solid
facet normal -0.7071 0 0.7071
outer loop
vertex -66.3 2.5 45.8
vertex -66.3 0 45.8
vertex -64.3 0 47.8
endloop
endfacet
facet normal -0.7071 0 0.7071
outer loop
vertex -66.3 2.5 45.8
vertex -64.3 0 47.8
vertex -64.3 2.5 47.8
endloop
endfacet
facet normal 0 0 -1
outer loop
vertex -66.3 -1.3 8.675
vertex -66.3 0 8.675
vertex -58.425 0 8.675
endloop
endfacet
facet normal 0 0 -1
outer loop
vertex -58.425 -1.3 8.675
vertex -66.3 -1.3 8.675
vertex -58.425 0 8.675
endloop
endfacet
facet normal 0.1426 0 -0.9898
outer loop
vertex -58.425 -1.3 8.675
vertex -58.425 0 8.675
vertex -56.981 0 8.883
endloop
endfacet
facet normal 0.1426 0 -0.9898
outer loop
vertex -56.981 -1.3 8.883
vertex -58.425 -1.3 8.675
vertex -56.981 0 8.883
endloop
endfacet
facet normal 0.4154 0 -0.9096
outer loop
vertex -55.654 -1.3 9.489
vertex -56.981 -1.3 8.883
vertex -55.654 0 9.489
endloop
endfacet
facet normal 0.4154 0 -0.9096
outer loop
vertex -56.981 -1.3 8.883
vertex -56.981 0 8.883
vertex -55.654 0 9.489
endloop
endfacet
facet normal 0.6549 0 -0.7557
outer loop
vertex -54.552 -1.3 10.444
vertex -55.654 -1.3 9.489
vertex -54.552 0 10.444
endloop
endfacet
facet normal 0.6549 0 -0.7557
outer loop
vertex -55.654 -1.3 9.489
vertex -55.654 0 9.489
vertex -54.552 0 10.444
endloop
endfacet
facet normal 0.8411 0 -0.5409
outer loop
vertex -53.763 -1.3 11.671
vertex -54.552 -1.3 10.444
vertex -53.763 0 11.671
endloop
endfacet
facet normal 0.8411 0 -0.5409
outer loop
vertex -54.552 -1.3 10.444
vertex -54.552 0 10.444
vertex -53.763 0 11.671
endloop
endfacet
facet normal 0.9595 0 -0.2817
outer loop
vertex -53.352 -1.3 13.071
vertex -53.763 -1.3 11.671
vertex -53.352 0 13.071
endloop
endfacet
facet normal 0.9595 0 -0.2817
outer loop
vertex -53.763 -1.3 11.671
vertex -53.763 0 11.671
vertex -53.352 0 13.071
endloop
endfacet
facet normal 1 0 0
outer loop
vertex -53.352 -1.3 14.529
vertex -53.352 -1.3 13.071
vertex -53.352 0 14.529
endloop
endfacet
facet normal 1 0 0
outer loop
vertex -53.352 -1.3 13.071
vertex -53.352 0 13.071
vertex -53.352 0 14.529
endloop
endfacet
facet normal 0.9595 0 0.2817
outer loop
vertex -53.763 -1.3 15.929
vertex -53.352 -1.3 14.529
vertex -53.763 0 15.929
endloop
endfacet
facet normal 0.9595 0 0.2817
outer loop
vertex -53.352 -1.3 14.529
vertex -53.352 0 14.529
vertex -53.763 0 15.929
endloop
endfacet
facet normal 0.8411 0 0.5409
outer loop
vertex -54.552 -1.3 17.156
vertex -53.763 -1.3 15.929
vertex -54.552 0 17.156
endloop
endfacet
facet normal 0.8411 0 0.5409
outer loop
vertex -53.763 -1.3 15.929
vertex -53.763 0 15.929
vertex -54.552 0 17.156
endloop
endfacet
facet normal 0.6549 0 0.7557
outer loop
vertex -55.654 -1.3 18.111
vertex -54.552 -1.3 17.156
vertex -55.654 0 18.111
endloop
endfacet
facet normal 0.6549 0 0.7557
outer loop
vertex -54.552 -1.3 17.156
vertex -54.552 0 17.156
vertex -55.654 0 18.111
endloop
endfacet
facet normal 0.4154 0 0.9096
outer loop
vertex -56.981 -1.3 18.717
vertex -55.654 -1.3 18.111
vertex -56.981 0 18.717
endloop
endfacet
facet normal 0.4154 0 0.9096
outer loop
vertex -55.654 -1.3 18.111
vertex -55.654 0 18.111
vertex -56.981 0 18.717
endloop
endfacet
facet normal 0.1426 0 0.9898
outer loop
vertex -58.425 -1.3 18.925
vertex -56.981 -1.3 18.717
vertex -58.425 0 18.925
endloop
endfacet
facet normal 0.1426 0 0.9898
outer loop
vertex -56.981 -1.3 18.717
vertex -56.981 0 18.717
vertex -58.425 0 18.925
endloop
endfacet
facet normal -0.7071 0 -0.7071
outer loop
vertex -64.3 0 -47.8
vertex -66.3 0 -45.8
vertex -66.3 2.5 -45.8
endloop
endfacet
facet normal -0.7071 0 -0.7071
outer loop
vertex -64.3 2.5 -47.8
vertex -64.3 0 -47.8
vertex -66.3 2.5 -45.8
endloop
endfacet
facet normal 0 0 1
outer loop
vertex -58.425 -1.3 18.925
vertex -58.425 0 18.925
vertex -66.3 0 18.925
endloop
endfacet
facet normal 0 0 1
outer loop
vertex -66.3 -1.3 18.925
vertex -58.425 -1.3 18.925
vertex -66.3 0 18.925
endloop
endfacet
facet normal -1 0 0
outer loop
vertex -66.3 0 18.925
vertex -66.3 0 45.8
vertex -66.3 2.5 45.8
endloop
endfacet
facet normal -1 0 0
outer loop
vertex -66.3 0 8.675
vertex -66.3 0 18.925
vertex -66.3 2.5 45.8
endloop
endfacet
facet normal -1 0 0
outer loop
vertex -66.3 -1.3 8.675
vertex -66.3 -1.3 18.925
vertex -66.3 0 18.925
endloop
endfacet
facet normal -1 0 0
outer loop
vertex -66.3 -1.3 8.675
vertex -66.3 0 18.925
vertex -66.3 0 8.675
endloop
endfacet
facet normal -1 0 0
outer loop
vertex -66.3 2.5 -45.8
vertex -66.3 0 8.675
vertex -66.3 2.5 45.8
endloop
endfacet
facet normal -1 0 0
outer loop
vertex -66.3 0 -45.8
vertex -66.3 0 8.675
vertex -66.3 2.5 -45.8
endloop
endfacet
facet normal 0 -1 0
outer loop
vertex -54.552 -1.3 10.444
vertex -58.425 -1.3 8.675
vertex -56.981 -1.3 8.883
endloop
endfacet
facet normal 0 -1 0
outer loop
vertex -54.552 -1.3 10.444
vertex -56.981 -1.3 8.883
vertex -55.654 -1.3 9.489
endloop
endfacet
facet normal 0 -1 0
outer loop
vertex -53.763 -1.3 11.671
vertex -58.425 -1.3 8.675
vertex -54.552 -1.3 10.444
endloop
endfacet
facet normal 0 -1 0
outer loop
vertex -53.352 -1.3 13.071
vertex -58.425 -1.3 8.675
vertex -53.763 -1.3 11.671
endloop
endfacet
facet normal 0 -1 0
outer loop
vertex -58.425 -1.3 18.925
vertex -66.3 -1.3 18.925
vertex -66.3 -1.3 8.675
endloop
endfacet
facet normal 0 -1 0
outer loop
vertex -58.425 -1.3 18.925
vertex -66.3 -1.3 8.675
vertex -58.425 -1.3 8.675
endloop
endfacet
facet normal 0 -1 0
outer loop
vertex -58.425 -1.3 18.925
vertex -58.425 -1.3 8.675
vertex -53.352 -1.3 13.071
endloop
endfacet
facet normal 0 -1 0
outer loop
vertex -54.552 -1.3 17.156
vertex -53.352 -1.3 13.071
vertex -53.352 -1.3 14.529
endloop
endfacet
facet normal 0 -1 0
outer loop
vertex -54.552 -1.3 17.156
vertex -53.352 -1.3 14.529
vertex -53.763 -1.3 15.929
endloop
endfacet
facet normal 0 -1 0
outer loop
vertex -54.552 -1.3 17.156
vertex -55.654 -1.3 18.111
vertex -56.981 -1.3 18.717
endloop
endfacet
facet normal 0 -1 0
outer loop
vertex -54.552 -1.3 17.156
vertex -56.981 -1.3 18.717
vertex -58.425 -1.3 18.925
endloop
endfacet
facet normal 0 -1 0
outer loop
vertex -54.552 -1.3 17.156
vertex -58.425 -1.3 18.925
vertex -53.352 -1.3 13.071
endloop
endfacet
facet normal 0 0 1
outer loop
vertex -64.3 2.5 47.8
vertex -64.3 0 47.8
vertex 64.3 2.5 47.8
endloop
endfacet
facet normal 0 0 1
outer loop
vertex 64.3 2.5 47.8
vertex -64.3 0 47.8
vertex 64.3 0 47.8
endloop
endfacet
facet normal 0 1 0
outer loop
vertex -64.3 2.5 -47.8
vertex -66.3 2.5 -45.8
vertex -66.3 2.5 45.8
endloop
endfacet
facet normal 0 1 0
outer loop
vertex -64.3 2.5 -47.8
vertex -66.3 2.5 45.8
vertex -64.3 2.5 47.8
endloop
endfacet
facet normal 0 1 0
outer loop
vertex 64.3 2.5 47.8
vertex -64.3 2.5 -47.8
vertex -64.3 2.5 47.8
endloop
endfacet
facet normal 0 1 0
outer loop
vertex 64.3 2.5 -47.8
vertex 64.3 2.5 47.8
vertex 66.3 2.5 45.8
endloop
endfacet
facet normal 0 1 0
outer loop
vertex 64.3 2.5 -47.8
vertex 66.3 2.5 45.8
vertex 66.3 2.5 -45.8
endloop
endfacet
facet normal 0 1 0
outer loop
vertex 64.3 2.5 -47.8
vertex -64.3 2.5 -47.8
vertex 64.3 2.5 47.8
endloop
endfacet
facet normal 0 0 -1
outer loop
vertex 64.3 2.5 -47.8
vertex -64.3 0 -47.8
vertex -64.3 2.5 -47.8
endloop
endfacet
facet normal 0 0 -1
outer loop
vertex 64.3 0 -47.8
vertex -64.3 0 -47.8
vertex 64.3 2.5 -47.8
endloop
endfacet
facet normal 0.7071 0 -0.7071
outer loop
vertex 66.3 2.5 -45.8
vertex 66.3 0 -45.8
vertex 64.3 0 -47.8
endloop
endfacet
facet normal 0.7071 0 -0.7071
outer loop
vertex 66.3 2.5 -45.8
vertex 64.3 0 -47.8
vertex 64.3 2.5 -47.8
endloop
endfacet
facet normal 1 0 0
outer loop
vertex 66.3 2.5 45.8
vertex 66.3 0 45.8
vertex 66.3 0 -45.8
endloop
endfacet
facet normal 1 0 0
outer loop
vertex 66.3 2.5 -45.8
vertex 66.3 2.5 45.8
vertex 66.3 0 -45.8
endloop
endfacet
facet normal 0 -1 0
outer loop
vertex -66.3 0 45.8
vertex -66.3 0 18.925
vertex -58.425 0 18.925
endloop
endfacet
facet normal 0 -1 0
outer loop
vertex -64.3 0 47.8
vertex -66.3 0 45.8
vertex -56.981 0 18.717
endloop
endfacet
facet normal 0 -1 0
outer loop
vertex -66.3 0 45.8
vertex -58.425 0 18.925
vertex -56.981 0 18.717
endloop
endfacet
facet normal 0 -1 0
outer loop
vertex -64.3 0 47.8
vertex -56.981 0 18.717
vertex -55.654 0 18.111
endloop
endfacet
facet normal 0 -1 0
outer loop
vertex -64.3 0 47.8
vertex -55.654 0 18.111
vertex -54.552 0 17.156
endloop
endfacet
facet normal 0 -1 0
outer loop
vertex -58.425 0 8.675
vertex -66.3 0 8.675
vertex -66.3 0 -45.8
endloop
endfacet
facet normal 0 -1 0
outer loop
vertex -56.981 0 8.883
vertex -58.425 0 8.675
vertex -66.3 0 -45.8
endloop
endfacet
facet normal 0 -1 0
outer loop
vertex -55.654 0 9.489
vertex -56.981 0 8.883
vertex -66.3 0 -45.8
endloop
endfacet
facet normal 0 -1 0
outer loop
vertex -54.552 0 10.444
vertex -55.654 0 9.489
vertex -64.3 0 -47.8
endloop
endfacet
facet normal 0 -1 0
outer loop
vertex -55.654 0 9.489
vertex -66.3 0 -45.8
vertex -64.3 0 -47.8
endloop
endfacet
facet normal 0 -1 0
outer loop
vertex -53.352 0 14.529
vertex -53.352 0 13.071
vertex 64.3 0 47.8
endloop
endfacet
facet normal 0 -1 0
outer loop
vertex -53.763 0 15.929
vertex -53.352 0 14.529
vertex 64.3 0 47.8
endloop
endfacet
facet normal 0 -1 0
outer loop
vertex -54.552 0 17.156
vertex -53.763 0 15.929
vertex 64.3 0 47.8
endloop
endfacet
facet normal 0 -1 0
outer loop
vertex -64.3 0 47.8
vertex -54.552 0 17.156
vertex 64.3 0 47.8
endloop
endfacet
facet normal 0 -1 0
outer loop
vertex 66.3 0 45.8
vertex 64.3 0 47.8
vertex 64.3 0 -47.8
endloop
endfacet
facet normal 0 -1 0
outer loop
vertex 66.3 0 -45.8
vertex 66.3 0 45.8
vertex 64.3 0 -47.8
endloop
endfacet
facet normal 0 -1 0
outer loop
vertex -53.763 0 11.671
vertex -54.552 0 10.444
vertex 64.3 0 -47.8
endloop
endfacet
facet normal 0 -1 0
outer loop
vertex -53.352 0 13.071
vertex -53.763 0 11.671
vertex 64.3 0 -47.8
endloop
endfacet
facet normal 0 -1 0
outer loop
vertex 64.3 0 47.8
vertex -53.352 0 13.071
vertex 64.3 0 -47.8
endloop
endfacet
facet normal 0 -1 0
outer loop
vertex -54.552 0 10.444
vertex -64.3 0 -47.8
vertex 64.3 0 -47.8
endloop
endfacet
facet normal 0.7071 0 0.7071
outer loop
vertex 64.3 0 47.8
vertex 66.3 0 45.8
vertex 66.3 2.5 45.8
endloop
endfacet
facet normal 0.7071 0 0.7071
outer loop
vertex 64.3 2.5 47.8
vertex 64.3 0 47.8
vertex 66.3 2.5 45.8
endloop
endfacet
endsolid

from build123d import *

# Parameters (mm, degrees)
SKETCH2_W           = 132.6
SKETCH2_H           = 95.6
BOSS_EXTRUDE1_DEPTH = 2.5
CHAMFER1_SIZE       = 2
BOSS_EXTRUDE2_DEPTH = 1.3


with BuildPart() as part:
    # Sketch2 → Boss-Extrude1 (new body)
    with BuildSketch(Plane(origin=(0, 0, 0), x_dir=(1, 0, 0), z_dir=(0, 1, 0))):
        Rectangle(SKETCH2_W, SKETCH2_H)
    extrude(amount=BOSS_EXTRUDE1_DEPTH)

    # Chamfer1
    chamfer1_edges = [part.edges().sort_by_distance(p)[0] for p in [
        (66.3, 1.25, 47.8),
        (-66.3, 1.25, 47.8),
        (-66.3, 1.25, -47.8),
        (66.3, 1.25, -47.8),
    ]]
    chamfer(chamfer1_edges, length=CHAMFER1_SIZE)

    # Sketch3 → Boss-Extrude2 (add)
    with BuildSketch(Plane.XZ):
        with BuildLine():
            Line((-58.425, 18.925), (-66.3, 18.925))
            Line((-66.3, 18.925), (-66.3, 8.675))
            Line((-66.3, 8.675), (-58.425, 8.675))
            ThreePointArc((-58.425, 8.675), (-53.3, 13.8), (-58.425, 18.925))
        make_face()
    extrude(amount=BOSS_EXTRUDE2_DEPTH)


solid = part.part
